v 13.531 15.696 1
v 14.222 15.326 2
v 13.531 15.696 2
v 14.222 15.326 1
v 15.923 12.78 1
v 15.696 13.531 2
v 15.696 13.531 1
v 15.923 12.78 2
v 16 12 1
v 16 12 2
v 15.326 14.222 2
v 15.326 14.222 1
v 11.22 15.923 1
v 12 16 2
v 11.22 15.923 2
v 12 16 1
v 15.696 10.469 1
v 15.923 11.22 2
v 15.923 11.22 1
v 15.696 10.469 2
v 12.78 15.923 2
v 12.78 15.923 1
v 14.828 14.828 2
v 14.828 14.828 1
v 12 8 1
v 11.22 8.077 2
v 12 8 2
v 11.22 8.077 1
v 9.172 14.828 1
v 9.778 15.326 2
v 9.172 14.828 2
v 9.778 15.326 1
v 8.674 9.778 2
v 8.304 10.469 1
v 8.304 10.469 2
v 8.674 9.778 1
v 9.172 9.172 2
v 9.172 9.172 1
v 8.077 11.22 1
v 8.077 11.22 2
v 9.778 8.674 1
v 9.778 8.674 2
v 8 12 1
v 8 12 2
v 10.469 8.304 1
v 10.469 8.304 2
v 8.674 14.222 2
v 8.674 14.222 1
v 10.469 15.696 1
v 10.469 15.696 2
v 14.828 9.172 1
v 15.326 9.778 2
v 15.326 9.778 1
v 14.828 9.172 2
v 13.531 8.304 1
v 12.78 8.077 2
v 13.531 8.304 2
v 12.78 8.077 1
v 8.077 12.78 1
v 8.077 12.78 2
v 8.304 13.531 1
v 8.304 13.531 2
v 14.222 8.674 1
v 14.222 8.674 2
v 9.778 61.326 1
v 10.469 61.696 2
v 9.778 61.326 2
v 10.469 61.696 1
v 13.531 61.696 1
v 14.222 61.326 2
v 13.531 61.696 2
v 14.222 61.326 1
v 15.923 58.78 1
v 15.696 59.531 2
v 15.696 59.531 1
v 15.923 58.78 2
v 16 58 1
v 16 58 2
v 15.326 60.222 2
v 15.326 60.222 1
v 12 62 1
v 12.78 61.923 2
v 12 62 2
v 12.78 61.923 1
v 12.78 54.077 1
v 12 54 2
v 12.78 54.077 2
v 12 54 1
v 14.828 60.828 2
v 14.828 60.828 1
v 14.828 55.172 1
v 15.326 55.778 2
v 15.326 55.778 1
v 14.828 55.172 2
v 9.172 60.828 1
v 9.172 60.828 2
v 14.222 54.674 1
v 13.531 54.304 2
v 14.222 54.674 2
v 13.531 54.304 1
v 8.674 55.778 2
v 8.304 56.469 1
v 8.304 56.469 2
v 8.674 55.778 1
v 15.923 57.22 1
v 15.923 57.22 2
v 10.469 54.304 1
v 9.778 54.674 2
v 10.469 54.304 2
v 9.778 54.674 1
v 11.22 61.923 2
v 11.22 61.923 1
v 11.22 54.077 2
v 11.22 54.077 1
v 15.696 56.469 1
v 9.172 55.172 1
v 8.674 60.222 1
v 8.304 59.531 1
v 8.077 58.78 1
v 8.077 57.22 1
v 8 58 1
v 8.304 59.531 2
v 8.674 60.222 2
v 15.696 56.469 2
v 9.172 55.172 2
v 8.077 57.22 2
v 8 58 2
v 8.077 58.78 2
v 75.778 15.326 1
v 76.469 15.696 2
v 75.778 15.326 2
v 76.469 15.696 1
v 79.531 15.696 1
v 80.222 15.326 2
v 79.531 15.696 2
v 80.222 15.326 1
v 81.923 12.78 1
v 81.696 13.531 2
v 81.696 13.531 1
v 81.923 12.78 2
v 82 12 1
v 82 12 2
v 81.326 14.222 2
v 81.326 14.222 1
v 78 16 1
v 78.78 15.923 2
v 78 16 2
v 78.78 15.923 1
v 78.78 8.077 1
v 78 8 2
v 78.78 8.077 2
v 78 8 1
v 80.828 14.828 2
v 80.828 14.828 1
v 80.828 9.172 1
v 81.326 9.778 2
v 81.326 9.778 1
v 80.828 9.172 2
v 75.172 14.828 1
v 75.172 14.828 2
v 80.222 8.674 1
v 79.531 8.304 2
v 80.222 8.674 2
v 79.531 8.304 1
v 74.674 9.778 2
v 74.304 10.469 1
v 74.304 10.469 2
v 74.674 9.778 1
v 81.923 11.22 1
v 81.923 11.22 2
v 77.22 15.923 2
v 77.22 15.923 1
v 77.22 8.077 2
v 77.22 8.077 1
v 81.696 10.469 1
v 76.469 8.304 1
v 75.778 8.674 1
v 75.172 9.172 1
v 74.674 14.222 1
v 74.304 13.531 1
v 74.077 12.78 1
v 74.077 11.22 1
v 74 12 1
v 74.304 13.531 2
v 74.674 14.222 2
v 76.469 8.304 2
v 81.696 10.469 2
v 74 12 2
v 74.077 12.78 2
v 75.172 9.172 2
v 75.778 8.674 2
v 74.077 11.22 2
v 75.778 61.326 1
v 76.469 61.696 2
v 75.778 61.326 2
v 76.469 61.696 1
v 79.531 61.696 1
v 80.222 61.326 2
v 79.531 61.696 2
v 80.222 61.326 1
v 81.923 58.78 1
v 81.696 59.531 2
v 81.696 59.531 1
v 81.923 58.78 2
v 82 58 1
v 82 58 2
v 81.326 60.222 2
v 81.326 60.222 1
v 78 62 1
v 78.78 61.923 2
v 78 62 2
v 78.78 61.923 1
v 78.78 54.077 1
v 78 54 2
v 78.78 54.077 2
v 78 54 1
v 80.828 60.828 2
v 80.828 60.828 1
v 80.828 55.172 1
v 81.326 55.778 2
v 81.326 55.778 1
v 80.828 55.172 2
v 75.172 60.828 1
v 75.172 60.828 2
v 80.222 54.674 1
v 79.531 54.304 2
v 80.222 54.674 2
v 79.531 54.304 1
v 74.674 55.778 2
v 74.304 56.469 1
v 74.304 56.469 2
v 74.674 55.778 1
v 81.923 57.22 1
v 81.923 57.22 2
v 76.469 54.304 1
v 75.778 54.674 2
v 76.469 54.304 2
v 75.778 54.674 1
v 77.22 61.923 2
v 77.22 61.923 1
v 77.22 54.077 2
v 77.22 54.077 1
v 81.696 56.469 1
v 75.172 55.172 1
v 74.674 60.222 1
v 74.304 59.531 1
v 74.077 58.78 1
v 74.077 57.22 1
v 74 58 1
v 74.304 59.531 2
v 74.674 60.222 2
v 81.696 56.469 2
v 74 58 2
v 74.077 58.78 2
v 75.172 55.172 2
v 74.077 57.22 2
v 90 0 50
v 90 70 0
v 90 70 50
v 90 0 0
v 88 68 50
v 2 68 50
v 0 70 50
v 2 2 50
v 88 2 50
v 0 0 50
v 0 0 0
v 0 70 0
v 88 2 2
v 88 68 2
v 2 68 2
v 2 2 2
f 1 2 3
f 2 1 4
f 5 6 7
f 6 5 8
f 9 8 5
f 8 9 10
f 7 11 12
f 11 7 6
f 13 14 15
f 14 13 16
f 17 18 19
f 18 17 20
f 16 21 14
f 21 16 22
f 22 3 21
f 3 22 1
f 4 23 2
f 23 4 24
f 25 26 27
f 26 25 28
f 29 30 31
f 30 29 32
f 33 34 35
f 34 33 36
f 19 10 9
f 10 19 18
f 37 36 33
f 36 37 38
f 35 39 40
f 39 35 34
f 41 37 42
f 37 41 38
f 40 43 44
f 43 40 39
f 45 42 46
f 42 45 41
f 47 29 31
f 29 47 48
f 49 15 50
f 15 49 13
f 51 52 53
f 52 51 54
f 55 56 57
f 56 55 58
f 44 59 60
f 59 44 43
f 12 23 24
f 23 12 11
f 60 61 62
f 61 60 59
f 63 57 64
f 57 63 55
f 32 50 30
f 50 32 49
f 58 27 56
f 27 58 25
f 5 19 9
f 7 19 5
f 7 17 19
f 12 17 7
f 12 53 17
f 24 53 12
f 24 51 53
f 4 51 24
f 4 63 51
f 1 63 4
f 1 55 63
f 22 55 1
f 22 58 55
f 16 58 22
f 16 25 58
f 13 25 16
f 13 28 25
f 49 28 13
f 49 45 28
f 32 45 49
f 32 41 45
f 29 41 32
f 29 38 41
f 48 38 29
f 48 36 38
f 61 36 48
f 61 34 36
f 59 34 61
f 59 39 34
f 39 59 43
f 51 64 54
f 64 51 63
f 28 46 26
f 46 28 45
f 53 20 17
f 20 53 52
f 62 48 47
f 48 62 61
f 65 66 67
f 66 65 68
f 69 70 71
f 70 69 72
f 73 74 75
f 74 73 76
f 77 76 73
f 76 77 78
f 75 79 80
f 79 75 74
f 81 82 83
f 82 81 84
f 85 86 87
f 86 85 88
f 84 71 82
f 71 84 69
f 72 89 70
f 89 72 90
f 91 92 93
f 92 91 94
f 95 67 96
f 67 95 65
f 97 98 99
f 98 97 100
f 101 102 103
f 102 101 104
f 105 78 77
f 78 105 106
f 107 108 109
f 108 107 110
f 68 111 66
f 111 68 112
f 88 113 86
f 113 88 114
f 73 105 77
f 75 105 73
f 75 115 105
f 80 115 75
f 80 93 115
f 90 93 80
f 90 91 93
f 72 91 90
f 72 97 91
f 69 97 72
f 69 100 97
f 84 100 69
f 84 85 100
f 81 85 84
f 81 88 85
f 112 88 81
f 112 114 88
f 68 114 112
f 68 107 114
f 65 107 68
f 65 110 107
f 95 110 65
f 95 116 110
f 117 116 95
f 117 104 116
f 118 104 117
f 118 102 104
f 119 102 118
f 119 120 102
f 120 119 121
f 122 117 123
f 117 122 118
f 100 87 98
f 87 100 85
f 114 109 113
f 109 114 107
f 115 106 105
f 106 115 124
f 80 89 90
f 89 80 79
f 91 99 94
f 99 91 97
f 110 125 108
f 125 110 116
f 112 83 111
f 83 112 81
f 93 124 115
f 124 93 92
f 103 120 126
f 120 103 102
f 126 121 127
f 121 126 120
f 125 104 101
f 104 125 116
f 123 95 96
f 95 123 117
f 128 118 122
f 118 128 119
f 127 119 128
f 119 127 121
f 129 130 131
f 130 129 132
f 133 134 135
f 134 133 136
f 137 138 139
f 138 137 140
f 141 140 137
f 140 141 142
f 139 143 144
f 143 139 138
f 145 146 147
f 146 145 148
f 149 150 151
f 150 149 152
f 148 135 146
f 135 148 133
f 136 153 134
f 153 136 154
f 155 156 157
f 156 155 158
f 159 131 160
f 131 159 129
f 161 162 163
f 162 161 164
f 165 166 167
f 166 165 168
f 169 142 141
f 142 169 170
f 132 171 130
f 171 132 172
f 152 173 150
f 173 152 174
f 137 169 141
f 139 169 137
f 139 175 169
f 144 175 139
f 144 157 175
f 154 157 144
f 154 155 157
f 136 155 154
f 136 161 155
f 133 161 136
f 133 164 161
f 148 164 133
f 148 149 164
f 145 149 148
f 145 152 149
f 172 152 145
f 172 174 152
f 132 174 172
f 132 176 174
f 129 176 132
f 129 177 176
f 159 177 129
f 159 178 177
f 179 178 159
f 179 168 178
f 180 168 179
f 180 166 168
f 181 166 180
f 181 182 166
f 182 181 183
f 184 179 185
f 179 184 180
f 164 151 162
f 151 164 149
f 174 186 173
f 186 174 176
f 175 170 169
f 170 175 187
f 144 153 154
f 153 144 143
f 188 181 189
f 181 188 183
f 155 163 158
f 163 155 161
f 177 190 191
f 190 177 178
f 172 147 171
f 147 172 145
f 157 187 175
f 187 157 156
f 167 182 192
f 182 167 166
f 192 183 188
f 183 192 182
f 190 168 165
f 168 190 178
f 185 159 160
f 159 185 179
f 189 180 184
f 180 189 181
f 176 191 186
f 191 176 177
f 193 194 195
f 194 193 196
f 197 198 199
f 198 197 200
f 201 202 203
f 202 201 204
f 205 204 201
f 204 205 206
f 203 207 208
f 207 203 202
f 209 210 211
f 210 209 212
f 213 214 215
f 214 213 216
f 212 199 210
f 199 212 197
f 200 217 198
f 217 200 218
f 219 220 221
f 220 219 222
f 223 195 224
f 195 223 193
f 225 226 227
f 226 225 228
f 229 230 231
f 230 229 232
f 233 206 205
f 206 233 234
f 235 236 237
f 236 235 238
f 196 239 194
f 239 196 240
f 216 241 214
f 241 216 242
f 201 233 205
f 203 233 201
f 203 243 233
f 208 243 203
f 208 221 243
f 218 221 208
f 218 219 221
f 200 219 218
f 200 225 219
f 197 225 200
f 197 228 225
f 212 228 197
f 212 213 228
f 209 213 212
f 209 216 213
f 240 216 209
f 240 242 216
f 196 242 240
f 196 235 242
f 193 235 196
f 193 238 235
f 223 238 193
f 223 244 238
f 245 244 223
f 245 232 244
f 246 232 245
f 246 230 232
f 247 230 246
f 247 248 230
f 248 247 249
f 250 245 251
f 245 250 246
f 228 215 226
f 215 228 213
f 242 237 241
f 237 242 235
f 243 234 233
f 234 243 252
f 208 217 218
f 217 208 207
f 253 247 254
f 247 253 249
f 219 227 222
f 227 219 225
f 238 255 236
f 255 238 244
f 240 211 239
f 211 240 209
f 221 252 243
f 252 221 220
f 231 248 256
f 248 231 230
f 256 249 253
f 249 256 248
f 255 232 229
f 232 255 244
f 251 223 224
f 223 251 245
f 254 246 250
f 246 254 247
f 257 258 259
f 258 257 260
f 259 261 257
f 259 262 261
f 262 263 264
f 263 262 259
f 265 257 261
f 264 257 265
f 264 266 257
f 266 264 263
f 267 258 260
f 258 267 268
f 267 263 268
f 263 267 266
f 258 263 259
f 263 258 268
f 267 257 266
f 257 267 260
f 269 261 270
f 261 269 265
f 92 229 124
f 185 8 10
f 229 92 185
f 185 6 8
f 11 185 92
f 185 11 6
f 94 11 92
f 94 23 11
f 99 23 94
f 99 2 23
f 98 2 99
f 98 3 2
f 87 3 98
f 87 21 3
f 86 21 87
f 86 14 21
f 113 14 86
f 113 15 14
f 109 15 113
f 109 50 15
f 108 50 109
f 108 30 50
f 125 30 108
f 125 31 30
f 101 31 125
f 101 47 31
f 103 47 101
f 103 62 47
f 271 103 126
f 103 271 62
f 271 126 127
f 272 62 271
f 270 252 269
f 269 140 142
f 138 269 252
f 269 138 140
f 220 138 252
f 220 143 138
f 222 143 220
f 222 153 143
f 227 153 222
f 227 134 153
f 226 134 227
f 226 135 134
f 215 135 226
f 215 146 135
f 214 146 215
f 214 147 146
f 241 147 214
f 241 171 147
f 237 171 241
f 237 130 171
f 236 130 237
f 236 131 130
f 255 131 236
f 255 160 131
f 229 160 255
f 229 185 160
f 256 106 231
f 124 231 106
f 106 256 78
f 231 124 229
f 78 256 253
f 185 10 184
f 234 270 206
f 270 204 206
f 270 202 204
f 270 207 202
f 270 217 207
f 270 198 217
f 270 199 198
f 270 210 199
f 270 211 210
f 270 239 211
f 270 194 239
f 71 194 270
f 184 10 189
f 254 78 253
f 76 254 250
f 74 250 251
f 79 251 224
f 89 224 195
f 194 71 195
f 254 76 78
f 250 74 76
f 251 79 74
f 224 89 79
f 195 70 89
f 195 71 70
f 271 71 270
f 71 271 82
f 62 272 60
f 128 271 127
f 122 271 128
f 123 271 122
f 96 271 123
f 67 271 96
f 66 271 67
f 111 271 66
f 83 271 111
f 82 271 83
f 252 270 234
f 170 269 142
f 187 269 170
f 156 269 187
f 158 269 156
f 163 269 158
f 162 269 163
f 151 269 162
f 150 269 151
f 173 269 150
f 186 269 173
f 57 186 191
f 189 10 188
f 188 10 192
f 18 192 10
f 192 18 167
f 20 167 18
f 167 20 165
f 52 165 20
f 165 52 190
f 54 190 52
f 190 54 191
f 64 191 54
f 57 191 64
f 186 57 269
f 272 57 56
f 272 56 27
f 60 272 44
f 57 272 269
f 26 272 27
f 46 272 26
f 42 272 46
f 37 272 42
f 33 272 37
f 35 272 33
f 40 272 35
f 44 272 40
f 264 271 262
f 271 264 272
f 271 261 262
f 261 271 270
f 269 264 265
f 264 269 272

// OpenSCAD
$fn = 32;

// ----------------------------------------------------------------------
// Enclosure box: bosses enclosure
// ----------------------------------------------------------------------

// --- parameters (mm) ---
box_l = 90;               // outer length, X
box_w = 70;               // outer width, Y
box_h = 50;               // outer height
wall_t = 2;               // wall thickness
boss_r = 4;               // corner boss radius
hole_r = 1.5;             // boss screw hole radius
boss_in = 12;             // boss inset from the corners

inner_h = box_h - wall_t;  // cavity depth
boss_h = inner_h - 2;  // corner boss height

difference() {
  cube([box_l, box_w, box_h]);
  translate([wall_t, wall_t, wall_t])
    cube([box_l - 2 * wall_t, box_w - 2 * wall_t, box_h]);
  for (sx = [0, 1], sy = [0, 1])
    translate([sx ? box_l - boss_in : boss_in,
               sy ? box_w - boss_in : boss_in, wall_t - 1]) {
      cylinder(r = boss_r, h = boss_h);
      translate([0, 0, boss_h - 4])
        cylinder(r = hole_r, h = 5);
    }
}
